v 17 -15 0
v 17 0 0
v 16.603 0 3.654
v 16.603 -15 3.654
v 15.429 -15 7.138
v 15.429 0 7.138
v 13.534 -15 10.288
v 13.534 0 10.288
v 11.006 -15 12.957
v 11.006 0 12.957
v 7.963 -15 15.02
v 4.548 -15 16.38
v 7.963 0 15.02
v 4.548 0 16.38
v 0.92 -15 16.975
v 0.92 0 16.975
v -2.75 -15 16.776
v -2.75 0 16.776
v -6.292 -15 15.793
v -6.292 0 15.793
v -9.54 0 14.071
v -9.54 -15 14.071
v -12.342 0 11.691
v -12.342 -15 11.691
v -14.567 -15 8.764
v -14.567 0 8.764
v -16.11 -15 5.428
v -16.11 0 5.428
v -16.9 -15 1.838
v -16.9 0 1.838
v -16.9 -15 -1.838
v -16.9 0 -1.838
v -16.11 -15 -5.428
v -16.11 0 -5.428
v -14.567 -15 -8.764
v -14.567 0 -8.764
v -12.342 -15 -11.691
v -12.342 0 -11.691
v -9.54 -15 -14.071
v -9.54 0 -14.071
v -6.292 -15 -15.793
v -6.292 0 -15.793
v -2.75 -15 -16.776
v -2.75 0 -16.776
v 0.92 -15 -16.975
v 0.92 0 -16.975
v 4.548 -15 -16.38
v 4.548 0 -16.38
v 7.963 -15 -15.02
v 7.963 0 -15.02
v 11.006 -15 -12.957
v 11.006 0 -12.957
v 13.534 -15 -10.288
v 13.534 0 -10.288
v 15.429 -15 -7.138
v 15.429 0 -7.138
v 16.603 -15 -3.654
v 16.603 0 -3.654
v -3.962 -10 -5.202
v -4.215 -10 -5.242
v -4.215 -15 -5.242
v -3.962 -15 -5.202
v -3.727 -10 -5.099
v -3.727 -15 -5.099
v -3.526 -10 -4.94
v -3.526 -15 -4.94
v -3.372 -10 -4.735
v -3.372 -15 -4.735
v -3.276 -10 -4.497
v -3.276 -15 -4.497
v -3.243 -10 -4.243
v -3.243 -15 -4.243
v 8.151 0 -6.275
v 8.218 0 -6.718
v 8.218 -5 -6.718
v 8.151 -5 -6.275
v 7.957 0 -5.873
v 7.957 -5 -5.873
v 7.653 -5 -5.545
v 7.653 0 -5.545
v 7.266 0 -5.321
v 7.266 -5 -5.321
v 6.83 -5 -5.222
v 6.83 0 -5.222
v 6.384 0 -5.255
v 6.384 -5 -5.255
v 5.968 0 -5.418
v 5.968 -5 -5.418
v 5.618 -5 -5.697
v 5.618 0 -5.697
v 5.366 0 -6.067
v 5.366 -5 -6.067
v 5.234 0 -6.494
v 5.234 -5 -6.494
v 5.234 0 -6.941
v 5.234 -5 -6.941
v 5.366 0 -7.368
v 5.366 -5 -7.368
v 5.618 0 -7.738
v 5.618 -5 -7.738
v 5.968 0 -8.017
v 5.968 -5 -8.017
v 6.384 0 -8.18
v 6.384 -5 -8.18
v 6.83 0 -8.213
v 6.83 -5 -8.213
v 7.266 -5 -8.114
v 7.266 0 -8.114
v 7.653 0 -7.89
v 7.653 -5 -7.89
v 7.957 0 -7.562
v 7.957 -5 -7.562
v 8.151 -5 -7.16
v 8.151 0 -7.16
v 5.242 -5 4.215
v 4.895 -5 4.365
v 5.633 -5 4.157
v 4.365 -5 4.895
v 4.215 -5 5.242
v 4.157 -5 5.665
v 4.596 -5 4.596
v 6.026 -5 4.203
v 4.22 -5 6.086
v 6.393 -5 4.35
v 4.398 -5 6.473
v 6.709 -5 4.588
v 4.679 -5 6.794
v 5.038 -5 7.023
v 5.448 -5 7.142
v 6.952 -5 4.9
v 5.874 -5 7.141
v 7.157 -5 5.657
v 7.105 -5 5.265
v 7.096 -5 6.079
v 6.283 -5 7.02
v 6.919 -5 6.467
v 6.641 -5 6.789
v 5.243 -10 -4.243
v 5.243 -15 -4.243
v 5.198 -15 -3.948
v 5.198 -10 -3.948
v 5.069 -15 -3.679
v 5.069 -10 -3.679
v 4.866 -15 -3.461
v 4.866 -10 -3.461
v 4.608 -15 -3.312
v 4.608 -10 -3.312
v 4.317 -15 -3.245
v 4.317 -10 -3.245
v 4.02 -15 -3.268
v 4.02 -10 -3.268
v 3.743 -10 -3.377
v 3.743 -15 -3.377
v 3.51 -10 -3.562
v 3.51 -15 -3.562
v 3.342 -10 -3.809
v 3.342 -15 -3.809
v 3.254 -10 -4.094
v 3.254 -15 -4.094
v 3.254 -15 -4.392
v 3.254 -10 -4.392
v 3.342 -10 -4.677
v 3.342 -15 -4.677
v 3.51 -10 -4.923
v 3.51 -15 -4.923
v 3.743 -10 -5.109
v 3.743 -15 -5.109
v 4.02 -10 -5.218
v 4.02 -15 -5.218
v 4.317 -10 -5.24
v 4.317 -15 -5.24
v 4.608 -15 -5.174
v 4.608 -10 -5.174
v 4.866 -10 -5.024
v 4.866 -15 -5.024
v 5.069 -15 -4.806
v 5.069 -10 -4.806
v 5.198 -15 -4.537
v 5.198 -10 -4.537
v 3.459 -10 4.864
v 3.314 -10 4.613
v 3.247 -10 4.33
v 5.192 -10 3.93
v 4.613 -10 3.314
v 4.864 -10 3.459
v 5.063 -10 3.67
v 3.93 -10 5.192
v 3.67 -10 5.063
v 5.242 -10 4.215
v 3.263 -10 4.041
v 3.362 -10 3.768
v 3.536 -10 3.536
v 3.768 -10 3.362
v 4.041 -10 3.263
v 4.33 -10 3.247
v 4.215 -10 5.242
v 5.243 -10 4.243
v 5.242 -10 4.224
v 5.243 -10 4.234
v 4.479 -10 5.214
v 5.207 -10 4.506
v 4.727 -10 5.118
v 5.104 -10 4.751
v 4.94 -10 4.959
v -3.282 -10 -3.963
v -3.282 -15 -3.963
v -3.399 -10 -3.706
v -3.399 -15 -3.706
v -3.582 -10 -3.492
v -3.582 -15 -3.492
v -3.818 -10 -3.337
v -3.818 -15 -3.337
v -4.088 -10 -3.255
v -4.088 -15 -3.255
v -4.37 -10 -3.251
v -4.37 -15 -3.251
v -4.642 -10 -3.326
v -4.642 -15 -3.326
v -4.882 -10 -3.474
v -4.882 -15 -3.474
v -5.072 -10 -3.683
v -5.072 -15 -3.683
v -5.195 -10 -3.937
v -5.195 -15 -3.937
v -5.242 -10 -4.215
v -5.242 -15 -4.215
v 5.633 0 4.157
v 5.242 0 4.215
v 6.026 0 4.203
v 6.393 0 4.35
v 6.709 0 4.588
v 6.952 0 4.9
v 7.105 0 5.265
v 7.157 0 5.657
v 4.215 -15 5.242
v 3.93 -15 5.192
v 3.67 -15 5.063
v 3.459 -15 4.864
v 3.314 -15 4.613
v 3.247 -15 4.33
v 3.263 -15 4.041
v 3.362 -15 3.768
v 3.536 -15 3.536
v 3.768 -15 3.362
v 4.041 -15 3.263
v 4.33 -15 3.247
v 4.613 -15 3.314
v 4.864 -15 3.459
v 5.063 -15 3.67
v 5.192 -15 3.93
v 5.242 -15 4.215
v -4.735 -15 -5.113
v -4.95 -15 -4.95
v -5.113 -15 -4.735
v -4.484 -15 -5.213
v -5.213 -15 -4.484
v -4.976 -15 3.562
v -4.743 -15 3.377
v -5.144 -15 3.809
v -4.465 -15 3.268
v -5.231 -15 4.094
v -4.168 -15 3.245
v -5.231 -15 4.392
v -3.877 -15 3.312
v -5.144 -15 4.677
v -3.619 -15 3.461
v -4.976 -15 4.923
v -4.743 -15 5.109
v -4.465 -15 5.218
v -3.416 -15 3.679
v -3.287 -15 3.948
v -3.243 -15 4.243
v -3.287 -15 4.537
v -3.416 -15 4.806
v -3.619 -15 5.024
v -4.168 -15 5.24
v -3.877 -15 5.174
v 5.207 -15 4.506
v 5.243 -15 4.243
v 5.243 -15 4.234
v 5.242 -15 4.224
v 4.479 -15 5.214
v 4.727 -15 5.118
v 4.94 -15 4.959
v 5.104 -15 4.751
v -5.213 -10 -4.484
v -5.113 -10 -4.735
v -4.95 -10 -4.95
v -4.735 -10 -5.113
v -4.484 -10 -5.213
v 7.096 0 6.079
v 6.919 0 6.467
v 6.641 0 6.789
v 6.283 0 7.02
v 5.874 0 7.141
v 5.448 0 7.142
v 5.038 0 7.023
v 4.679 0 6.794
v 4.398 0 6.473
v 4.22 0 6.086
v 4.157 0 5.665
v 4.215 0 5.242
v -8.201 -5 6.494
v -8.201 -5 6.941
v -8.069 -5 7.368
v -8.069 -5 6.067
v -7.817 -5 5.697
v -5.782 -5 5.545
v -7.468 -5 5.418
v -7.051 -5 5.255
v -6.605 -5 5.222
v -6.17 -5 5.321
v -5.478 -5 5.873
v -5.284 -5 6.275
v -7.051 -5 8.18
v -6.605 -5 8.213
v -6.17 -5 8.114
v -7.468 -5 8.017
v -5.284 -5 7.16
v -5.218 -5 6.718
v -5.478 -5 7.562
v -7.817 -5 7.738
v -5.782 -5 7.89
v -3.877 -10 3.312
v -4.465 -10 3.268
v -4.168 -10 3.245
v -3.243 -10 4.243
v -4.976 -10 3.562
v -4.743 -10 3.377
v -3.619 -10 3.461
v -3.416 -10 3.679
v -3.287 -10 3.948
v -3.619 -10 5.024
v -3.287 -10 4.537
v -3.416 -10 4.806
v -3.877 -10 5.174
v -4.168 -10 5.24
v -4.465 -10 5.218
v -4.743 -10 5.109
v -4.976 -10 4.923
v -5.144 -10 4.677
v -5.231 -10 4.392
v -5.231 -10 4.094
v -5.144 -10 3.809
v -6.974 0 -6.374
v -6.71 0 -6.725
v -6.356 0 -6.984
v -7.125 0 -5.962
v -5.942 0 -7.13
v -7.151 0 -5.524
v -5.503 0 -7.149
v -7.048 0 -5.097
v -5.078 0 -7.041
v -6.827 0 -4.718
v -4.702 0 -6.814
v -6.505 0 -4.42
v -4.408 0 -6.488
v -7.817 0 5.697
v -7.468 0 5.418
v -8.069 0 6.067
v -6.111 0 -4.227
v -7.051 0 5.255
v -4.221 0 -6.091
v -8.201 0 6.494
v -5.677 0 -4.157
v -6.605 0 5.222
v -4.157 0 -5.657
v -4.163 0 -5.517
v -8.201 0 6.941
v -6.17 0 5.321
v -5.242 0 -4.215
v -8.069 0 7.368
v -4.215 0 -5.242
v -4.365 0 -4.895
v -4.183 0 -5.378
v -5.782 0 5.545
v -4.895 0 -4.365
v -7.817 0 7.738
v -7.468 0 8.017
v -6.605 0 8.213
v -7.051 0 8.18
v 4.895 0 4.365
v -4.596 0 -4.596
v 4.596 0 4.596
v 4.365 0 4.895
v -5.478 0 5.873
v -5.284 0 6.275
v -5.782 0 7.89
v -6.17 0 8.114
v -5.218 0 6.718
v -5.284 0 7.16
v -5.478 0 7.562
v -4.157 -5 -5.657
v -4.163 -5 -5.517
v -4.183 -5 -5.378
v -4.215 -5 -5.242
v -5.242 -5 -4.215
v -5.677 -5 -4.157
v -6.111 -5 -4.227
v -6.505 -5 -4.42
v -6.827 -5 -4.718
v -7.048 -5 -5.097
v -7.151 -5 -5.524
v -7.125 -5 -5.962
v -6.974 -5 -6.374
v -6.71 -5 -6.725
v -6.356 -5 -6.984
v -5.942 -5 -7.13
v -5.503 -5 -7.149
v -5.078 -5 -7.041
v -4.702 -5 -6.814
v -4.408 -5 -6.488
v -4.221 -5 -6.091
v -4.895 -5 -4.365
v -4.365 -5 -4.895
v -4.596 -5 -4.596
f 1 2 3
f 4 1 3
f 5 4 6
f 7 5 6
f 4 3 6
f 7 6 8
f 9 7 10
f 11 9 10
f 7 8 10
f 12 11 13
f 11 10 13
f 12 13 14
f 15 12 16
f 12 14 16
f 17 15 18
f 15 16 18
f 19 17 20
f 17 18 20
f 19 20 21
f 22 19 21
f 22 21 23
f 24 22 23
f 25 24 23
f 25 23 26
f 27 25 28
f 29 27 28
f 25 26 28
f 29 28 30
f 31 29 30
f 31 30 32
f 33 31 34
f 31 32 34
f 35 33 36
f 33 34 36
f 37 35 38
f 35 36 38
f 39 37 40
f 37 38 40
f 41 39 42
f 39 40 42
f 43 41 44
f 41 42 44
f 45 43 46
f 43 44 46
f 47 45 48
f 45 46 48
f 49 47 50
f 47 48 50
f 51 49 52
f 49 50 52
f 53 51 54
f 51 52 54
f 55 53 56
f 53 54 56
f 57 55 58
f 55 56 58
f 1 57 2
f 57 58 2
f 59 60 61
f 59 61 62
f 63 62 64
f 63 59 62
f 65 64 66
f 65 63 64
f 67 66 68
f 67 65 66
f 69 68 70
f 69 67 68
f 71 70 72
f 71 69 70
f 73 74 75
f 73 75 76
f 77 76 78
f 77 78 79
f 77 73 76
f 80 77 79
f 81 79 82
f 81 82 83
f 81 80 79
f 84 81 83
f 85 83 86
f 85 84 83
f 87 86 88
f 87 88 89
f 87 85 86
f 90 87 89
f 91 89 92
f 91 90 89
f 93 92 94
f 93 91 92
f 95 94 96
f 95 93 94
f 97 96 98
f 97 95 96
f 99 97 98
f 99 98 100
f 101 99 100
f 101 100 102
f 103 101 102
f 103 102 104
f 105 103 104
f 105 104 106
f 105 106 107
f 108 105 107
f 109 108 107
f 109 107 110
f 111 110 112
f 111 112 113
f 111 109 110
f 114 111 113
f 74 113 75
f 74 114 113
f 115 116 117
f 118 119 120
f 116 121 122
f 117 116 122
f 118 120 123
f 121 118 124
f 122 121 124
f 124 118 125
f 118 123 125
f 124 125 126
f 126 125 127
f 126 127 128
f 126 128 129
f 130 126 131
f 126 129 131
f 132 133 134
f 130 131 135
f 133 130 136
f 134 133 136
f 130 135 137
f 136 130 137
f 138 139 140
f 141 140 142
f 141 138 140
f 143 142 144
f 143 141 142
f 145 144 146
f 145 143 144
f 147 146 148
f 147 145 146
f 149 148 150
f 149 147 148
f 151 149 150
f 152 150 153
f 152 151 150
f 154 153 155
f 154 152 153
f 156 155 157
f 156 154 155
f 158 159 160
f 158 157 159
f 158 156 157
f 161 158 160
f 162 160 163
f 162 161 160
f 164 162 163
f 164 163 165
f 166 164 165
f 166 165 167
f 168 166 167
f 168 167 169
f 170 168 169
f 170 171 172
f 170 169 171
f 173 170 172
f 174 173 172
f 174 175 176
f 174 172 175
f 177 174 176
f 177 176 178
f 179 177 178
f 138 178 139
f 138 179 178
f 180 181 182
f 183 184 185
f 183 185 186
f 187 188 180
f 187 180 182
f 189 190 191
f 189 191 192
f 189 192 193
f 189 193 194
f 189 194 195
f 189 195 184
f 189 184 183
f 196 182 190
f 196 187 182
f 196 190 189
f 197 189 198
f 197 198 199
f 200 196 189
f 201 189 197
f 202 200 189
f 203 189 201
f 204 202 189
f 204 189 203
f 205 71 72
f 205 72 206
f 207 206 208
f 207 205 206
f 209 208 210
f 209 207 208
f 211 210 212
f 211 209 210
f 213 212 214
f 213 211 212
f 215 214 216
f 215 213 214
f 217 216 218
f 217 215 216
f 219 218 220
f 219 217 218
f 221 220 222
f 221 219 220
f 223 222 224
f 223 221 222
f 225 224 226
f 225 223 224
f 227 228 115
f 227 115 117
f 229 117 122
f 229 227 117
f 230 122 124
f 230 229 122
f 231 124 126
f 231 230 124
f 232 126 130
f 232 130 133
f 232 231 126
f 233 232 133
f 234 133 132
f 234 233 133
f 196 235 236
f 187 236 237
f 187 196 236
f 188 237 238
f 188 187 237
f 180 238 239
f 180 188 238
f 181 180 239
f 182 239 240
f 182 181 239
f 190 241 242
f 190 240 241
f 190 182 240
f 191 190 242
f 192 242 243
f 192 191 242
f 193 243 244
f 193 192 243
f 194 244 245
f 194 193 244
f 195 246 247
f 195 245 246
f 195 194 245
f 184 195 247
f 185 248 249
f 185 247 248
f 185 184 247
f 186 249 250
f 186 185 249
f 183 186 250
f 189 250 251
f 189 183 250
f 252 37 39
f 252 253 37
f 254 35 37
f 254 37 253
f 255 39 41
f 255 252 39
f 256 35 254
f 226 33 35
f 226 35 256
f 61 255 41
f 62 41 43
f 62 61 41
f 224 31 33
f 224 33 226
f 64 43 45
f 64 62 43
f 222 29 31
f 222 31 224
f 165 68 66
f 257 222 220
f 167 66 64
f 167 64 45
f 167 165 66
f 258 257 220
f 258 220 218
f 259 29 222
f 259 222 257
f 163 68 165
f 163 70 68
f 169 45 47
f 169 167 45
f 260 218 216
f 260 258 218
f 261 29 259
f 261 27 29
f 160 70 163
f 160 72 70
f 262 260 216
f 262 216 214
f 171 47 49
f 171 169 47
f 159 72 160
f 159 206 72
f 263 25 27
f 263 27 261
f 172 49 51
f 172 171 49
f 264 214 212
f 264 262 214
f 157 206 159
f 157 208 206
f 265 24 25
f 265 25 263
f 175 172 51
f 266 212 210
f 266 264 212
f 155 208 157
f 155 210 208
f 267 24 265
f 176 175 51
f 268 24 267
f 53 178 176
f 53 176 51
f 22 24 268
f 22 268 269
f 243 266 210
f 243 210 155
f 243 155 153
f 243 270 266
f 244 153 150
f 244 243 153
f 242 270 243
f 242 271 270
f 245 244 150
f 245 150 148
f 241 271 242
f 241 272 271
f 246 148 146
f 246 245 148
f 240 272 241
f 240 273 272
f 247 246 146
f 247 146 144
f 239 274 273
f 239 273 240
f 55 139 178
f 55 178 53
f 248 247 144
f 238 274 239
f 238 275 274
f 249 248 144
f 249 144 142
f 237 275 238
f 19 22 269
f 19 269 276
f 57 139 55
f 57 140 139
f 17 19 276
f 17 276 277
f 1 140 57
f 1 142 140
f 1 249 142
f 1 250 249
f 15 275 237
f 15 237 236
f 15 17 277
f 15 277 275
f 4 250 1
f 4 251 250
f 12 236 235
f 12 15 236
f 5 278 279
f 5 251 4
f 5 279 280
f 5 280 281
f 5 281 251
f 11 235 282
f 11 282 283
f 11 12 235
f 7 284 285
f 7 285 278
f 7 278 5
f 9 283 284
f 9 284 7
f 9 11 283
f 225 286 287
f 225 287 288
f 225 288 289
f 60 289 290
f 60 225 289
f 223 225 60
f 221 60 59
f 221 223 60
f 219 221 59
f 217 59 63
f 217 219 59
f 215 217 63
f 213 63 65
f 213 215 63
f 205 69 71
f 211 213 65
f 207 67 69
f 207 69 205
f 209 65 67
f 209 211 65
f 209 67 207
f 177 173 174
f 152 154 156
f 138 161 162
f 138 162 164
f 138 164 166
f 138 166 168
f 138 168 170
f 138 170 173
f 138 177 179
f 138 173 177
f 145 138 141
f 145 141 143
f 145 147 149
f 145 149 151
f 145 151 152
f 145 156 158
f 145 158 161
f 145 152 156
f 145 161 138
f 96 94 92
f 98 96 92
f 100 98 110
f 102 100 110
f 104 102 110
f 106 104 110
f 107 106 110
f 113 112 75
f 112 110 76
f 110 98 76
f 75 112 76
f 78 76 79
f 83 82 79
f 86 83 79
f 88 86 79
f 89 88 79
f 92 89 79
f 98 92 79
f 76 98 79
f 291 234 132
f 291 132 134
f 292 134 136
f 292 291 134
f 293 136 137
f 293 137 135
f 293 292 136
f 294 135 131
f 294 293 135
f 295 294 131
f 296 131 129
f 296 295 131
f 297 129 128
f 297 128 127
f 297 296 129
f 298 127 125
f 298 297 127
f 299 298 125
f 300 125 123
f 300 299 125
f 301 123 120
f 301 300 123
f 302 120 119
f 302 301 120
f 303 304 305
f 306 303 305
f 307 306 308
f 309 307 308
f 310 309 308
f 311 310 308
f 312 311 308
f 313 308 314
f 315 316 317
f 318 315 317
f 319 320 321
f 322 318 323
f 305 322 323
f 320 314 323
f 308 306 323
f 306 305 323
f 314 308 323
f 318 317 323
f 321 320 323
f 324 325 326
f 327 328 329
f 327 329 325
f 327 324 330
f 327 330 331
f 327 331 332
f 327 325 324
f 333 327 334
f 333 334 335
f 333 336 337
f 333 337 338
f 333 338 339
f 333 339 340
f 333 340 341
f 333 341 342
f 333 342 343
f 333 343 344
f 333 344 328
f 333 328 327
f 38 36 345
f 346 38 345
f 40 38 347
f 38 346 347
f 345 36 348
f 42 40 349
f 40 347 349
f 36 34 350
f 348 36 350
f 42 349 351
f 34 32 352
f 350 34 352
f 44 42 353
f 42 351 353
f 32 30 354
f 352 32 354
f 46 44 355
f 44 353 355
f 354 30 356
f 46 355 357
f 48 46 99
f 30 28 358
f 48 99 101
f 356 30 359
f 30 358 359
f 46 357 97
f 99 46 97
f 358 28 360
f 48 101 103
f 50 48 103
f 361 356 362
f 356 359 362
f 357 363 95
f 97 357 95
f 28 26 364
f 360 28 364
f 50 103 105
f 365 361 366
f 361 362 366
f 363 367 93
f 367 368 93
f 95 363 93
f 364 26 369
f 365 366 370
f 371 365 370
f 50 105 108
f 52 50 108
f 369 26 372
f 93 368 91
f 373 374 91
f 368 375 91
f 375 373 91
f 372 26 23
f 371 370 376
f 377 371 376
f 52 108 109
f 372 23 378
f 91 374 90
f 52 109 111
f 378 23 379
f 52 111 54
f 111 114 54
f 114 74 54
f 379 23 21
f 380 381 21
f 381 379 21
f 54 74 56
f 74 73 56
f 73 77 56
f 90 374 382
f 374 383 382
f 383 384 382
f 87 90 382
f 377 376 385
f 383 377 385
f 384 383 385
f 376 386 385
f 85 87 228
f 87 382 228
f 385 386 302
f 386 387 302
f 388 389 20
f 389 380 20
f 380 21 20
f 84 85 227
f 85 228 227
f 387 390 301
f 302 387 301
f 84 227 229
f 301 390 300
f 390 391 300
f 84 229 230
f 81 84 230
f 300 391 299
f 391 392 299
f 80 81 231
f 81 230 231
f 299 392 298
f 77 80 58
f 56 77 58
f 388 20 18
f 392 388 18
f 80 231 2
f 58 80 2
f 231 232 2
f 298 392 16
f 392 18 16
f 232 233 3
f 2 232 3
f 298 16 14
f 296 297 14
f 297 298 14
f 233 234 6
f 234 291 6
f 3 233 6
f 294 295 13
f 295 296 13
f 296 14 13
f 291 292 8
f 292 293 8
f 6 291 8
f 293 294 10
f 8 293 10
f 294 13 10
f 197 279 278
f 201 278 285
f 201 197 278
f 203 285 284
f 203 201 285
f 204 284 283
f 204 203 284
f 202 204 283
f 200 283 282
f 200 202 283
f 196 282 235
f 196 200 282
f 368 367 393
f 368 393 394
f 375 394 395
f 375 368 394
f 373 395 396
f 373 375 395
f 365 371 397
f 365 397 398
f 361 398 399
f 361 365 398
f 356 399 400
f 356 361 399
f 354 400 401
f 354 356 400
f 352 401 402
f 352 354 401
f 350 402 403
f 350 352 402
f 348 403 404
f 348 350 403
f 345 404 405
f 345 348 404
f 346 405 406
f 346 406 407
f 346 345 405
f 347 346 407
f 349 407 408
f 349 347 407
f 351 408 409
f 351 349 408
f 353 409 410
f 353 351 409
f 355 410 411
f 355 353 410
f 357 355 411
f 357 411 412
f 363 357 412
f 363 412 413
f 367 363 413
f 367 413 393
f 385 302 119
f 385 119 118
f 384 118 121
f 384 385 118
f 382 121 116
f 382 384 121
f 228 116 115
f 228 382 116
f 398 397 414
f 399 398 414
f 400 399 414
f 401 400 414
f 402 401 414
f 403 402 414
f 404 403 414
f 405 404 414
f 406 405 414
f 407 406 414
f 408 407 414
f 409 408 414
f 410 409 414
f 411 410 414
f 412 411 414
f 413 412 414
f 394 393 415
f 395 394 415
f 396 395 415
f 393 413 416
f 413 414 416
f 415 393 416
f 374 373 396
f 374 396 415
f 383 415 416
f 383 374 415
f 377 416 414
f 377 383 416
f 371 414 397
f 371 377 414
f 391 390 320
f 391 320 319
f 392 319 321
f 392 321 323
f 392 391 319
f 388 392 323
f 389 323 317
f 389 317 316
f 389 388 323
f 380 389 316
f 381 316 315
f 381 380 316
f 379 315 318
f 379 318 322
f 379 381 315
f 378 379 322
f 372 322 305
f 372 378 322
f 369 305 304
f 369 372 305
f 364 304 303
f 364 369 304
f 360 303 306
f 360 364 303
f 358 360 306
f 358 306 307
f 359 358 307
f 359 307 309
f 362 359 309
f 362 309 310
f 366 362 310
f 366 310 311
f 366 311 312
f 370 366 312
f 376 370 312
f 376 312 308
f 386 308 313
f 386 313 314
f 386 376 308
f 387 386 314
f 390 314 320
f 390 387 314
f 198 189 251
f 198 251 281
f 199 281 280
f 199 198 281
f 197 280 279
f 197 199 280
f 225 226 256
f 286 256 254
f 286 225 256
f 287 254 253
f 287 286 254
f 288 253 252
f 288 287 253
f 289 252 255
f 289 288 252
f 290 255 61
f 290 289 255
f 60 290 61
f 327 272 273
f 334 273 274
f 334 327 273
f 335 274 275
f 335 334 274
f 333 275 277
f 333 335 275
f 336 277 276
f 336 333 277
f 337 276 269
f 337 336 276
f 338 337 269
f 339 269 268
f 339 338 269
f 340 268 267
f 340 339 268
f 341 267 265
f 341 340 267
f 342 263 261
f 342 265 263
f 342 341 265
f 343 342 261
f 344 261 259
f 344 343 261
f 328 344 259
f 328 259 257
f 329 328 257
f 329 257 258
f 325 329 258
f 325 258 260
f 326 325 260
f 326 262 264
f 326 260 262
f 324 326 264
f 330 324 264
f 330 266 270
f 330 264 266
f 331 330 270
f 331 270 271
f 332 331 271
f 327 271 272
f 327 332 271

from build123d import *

# Parameters (mm, degrees)
F0_R     = 17
F0_R_2   = 1.5
F0_R_3   = 1
F1_DEPTH = 15
F2_START = 10
F2_DEPTH = 15
F3_DEPTH = 5


# Not quite as in the source:
# - a feature names something its author has since deleted; it is built from what else it names


with BuildPart() as f1:
    # F0 (on Front) → F1 (new body)
    with BuildSketch(Plane.XZ):
        Circle(F0_R)
        with BuildLine():
            ThreePointArc((-4.2152867015, -5.2422664968), (-4.1715341961, -5.447511614), (-4.1568542495, -5.6568542495))
            ThreePointArc((-4.1568542495, -5.6568542495), (-6.8551617286, -6.5591065343), (-5.2422664968, -4.2152867015))
            ThreePointArc((-5.2422664968, -4.2152867015), (-4.2289624147, -3.2427342391), (-3.2426406871, -4.2426406871))
            ThreePointArc((-3.2426406871, -4.2426406871), (-3.525928058, -4.9400093179), (-4.2152867015, -5.2422664968))
        make_face(mode=Mode.SUBTRACT)
        with Locations((6.7175144213, -6.7175144213)):
            Circle(F0_R_2, mode=Mode.SUBTRACT)
        with Locations((4.2426406871, -4.2426406871)):
            Circle(F0_R_3, mode=Mode.SUBTRACT)
        with Locations((-4.2426406871, 4.2426406871)):
            Circle(F0_R_3, mode=Mode.SUBTRACT)
        with Locations((-6.7175144213, 6.7175144213)):
            Circle(F0_R_2, mode=Mode.SUBTRACT)
        with BuildLine():
            ThreePointArc((4.2152867015, 5.2422664968), (5.447511614, 7.1421743029), (7.1568542495, 5.6568542495))
            ThreePointArc((7.1568542495, 5.6568542495), (6.5591065343, 4.4585467704), (5.2422664968, 4.2152867015))
            ThreePointArc((5.2422664968, 4.2152867015), (3.5355339059, 3.5355339059), (4.2152867015, 5.2422664968))
        make_face(mode=Mode.SUBTRACT)
        with BuildLine():
            ThreePointArc((5.2422664968, 4.2152867015), (6.5591065343, 4.4585467704), (7.1568542495, 5.6568542495))
            ThreePointArc((7.1568542495, 5.6568542495), (5.447511614, 7.1421743029), (4.2152867015, 5.2422664968))
            ThreePointArc((4.2152867015, 5.2422664968), (4.9400093179, 4.9593533163), (5.2426406871, 4.2426406871))
            ThreePointArc((5.2426406871, 4.2426406871), (5.2425471352, 4.2289624147), (5.2422664968, 4.2152867015))
        make_face()
        with BuildLine():
            ThreePointArc((5.2422664968, 4.2152867015), (4.5961940777, 4.5961940777), (4.2152867015, 5.2422664968))
            ThreePointArc((4.2152867015, 5.2422664968), (3.5355339059, 3.5355339059), (5.2422664968, 4.2152867015))
        make_face()
        with BuildLine():
            ThreePointArc((-5.2422664968, -4.2152867015), (-6.8551617286, -6.5591065343), (-4.1568542495, -5.6568542495))
            ThreePointArc((-4.1568542495, -5.6568542495), (-4.1715341961, -5.447511614), (-4.2152867015, -5.2422664968))
            ThreePointArc((-4.2152867015, -5.2422664968), (-4.9497474683, -4.9497474683), (-5.2422664968, -4.2152867015))
        make_face()
        with BuildLine():
            ThreePointArc((-5.2422664968, -4.2152867015), (-4.9497474683, -4.9497474683), (-4.2152867015, -5.2422664968))
            ThreePointArc((-4.2152867015, -5.2422664968), (-4.5961940777, -4.5961940777), (-5.2422664968, -4.2152867015))
        make_face()
        with BuildLine():
            ThreePointArc((-5.2422664968, -4.2152867015), (-4.5961940777, -4.5961940777), (-4.2152867015, -5.2422664968))
            ThreePointArc((-4.2152867015, -5.2422664968), (-3.525928058, -4.9400093179), (-3.2426406871, -4.2426406871))
            ThreePointArc((-3.2426406871, -4.2426406871), (-4.2289624147, -3.2427342391), (-5.2422664968, -4.2152867015))
        make_face()
        with BuildLine():
            ThreePointArc((5.2426406871, 4.2426406871), (4.9400093179, 4.9593533163), (4.2152867015, 5.2422664968))
            ThreePointArc((4.2152867015, 5.2422664968), (4.5961940777, 4.5961940777), (5.2422664968, 4.2152867015))
            ThreePointArc((5.2422664968, 4.2152867015), (5.2425471352, 4.2289624147), (5.2426406871, 4.2426406871))
        make_face()
        with Locations((4.2426406871, -4.2426406871)):
            Circle(F0_R_3)
        with Locations((-4.2426406871, 4.2426406871)):
            Circle(F0_R_3)
        with Locations((-6.7175144213, 6.7175144213)):
            Circle(F0_R_2)
        with Locations((6.7175144213, -6.7175144213)):
            Circle(F0_R_2)
    extrude(amount=F1_DEPTH)

    # F0 (on Front) → F2 (cut)
    with BuildSketch(Plane.XZ.offset(F2_START)):
        with BuildLine():
            ThreePointArc((-5.2422664968, -4.2152867015), (-4.5961940777, -4.5961940777), (-4.2152867015, -5.2422664968))
            ThreePointArc((-4.2152867015, -5.2422664968), (-3.525928058, -4.9400093179), (-3.2426406871, -4.2426406871))
            ThreePointArc((-3.2426406871, -4.2426406871), (-4.2289624147, -3.2427342391), (-5.2422664968, -4.2152867015))
        make_face()
        with BuildLine():
            ThreePointArc((-5.2422664968, -4.2152867015), (-4.9497474683, -4.9497474683), (-4.2152867015, -5.2422664968))
            ThreePointArc((-4.2152867015, -5.2422664968), (-4.5961940777, -4.5961940777), (-5.2422664968, -4.2152867015))
        make_face()
        with Locations((4.2426406871, -4.2426406871)):
            Circle(F0_R_3)
        with BuildLine():
            ThreePointArc((5.2422664968, 4.2152867015), (4.5961940777, 4.5961940777), (4.2152867015, 5.2422664968))
            ThreePointArc((4.2152867015, 5.2422664968), (3.5355339059, 3.5355339059), (5.2422664968, 4.2152867015))
        make_face()
        with BuildLine():
            ThreePointArc((5.2426406871, 4.2426406871), (4.9400093179, 4.9593533163), (4.2152867015, 5.2422664968))
            ThreePointArc((4.2152867015, 5.2422664968), (4.5961940777, 4.5961940777), (5.2422664968, 4.2152867015))
            ThreePointArc((5.2422664968, 4.2152867015), (5.2425471352, 4.2289624147), (5.2426406871, 4.2426406871))
        make_face()
        with Locations((-4.2426406871, 4.2426406871)):
            Circle(F0_R_3)
    extrude(amount=F2_DEPTH, mode=Mode.SUBTRACT)

    # F0 (on Front) → F3 (cut)
    with BuildSketch(Plane.XZ):
        with BuildLine():
            ThreePointArc((5.2422664968, 4.2152867015), (6.5591065343, 4.4585467704), (7.1568542495, 5.6568542495))
            ThreePointArc((7.1568542495, 5.6568542495), (5.447511614, 7.1421743029), (4.2152867015, 5.2422664968))
            ThreePointArc((4.2152867015, 5.2422664968), (4.9400093179, 4.9593533163), (5.2426406871, 4.2426406871))
            ThreePointArc((5.2426406871, 4.2426406871), (5.2425471352, 4.2289624147), (5.2422664968, 4.2152867015))
        make_face()
        with BuildLine():
            ThreePointArc((5.2426406871, 4.2426406871), (4.9400093179, 4.9593533163), (4.2152867015, 5.2422664968))
            ThreePointArc((4.2152867015, 5.2422664968), (4.5961940777, 4.5961940777), (5.2422664968, 4.2152867015))
            ThreePointArc((5.2422664968, 4.2152867015), (5.2425471352, 4.2289624147), (5.2426406871, 4.2426406871))
        make_face()
        with BuildLine():
            ThreePointArc((-5.2422664968, -4.2152867015), (-6.8551617286, -6.5591065343), (-4.1568542495, -5.6568542495))
            ThreePointArc((-4.1568542495, -5.6568542495), (-4.1715341961, -5.447511614), (-4.2152867015, -5.2422664968))
            ThreePointArc((-4.2152867015, -5.2422664968), (-4.9497474683, -4.9497474683), (-5.2422664968, -4.2152867015))
        make_face()
        with BuildLine():
            ThreePointArc((-5.2422664968, -4.2152867015), (-4.9497474683, -4.9497474683), (-4.2152867015, -5.2422664968))
            ThreePointArc((-4.2152867015, -5.2422664968), (-4.5961940777, -4.5961940777), (-5.2422664968, -4.2152867015))
        make_face()
        with Locations((6.7175144213, -6.7175144213)):
            Circle(F0_R_2)
        with Locations((-6.7175144213, 6.7175144213)):
            Circle(F0_R_2)
    extrude(amount=F3_DEPTH, mode=Mode.SUBTRACT)


solid = f1.part
